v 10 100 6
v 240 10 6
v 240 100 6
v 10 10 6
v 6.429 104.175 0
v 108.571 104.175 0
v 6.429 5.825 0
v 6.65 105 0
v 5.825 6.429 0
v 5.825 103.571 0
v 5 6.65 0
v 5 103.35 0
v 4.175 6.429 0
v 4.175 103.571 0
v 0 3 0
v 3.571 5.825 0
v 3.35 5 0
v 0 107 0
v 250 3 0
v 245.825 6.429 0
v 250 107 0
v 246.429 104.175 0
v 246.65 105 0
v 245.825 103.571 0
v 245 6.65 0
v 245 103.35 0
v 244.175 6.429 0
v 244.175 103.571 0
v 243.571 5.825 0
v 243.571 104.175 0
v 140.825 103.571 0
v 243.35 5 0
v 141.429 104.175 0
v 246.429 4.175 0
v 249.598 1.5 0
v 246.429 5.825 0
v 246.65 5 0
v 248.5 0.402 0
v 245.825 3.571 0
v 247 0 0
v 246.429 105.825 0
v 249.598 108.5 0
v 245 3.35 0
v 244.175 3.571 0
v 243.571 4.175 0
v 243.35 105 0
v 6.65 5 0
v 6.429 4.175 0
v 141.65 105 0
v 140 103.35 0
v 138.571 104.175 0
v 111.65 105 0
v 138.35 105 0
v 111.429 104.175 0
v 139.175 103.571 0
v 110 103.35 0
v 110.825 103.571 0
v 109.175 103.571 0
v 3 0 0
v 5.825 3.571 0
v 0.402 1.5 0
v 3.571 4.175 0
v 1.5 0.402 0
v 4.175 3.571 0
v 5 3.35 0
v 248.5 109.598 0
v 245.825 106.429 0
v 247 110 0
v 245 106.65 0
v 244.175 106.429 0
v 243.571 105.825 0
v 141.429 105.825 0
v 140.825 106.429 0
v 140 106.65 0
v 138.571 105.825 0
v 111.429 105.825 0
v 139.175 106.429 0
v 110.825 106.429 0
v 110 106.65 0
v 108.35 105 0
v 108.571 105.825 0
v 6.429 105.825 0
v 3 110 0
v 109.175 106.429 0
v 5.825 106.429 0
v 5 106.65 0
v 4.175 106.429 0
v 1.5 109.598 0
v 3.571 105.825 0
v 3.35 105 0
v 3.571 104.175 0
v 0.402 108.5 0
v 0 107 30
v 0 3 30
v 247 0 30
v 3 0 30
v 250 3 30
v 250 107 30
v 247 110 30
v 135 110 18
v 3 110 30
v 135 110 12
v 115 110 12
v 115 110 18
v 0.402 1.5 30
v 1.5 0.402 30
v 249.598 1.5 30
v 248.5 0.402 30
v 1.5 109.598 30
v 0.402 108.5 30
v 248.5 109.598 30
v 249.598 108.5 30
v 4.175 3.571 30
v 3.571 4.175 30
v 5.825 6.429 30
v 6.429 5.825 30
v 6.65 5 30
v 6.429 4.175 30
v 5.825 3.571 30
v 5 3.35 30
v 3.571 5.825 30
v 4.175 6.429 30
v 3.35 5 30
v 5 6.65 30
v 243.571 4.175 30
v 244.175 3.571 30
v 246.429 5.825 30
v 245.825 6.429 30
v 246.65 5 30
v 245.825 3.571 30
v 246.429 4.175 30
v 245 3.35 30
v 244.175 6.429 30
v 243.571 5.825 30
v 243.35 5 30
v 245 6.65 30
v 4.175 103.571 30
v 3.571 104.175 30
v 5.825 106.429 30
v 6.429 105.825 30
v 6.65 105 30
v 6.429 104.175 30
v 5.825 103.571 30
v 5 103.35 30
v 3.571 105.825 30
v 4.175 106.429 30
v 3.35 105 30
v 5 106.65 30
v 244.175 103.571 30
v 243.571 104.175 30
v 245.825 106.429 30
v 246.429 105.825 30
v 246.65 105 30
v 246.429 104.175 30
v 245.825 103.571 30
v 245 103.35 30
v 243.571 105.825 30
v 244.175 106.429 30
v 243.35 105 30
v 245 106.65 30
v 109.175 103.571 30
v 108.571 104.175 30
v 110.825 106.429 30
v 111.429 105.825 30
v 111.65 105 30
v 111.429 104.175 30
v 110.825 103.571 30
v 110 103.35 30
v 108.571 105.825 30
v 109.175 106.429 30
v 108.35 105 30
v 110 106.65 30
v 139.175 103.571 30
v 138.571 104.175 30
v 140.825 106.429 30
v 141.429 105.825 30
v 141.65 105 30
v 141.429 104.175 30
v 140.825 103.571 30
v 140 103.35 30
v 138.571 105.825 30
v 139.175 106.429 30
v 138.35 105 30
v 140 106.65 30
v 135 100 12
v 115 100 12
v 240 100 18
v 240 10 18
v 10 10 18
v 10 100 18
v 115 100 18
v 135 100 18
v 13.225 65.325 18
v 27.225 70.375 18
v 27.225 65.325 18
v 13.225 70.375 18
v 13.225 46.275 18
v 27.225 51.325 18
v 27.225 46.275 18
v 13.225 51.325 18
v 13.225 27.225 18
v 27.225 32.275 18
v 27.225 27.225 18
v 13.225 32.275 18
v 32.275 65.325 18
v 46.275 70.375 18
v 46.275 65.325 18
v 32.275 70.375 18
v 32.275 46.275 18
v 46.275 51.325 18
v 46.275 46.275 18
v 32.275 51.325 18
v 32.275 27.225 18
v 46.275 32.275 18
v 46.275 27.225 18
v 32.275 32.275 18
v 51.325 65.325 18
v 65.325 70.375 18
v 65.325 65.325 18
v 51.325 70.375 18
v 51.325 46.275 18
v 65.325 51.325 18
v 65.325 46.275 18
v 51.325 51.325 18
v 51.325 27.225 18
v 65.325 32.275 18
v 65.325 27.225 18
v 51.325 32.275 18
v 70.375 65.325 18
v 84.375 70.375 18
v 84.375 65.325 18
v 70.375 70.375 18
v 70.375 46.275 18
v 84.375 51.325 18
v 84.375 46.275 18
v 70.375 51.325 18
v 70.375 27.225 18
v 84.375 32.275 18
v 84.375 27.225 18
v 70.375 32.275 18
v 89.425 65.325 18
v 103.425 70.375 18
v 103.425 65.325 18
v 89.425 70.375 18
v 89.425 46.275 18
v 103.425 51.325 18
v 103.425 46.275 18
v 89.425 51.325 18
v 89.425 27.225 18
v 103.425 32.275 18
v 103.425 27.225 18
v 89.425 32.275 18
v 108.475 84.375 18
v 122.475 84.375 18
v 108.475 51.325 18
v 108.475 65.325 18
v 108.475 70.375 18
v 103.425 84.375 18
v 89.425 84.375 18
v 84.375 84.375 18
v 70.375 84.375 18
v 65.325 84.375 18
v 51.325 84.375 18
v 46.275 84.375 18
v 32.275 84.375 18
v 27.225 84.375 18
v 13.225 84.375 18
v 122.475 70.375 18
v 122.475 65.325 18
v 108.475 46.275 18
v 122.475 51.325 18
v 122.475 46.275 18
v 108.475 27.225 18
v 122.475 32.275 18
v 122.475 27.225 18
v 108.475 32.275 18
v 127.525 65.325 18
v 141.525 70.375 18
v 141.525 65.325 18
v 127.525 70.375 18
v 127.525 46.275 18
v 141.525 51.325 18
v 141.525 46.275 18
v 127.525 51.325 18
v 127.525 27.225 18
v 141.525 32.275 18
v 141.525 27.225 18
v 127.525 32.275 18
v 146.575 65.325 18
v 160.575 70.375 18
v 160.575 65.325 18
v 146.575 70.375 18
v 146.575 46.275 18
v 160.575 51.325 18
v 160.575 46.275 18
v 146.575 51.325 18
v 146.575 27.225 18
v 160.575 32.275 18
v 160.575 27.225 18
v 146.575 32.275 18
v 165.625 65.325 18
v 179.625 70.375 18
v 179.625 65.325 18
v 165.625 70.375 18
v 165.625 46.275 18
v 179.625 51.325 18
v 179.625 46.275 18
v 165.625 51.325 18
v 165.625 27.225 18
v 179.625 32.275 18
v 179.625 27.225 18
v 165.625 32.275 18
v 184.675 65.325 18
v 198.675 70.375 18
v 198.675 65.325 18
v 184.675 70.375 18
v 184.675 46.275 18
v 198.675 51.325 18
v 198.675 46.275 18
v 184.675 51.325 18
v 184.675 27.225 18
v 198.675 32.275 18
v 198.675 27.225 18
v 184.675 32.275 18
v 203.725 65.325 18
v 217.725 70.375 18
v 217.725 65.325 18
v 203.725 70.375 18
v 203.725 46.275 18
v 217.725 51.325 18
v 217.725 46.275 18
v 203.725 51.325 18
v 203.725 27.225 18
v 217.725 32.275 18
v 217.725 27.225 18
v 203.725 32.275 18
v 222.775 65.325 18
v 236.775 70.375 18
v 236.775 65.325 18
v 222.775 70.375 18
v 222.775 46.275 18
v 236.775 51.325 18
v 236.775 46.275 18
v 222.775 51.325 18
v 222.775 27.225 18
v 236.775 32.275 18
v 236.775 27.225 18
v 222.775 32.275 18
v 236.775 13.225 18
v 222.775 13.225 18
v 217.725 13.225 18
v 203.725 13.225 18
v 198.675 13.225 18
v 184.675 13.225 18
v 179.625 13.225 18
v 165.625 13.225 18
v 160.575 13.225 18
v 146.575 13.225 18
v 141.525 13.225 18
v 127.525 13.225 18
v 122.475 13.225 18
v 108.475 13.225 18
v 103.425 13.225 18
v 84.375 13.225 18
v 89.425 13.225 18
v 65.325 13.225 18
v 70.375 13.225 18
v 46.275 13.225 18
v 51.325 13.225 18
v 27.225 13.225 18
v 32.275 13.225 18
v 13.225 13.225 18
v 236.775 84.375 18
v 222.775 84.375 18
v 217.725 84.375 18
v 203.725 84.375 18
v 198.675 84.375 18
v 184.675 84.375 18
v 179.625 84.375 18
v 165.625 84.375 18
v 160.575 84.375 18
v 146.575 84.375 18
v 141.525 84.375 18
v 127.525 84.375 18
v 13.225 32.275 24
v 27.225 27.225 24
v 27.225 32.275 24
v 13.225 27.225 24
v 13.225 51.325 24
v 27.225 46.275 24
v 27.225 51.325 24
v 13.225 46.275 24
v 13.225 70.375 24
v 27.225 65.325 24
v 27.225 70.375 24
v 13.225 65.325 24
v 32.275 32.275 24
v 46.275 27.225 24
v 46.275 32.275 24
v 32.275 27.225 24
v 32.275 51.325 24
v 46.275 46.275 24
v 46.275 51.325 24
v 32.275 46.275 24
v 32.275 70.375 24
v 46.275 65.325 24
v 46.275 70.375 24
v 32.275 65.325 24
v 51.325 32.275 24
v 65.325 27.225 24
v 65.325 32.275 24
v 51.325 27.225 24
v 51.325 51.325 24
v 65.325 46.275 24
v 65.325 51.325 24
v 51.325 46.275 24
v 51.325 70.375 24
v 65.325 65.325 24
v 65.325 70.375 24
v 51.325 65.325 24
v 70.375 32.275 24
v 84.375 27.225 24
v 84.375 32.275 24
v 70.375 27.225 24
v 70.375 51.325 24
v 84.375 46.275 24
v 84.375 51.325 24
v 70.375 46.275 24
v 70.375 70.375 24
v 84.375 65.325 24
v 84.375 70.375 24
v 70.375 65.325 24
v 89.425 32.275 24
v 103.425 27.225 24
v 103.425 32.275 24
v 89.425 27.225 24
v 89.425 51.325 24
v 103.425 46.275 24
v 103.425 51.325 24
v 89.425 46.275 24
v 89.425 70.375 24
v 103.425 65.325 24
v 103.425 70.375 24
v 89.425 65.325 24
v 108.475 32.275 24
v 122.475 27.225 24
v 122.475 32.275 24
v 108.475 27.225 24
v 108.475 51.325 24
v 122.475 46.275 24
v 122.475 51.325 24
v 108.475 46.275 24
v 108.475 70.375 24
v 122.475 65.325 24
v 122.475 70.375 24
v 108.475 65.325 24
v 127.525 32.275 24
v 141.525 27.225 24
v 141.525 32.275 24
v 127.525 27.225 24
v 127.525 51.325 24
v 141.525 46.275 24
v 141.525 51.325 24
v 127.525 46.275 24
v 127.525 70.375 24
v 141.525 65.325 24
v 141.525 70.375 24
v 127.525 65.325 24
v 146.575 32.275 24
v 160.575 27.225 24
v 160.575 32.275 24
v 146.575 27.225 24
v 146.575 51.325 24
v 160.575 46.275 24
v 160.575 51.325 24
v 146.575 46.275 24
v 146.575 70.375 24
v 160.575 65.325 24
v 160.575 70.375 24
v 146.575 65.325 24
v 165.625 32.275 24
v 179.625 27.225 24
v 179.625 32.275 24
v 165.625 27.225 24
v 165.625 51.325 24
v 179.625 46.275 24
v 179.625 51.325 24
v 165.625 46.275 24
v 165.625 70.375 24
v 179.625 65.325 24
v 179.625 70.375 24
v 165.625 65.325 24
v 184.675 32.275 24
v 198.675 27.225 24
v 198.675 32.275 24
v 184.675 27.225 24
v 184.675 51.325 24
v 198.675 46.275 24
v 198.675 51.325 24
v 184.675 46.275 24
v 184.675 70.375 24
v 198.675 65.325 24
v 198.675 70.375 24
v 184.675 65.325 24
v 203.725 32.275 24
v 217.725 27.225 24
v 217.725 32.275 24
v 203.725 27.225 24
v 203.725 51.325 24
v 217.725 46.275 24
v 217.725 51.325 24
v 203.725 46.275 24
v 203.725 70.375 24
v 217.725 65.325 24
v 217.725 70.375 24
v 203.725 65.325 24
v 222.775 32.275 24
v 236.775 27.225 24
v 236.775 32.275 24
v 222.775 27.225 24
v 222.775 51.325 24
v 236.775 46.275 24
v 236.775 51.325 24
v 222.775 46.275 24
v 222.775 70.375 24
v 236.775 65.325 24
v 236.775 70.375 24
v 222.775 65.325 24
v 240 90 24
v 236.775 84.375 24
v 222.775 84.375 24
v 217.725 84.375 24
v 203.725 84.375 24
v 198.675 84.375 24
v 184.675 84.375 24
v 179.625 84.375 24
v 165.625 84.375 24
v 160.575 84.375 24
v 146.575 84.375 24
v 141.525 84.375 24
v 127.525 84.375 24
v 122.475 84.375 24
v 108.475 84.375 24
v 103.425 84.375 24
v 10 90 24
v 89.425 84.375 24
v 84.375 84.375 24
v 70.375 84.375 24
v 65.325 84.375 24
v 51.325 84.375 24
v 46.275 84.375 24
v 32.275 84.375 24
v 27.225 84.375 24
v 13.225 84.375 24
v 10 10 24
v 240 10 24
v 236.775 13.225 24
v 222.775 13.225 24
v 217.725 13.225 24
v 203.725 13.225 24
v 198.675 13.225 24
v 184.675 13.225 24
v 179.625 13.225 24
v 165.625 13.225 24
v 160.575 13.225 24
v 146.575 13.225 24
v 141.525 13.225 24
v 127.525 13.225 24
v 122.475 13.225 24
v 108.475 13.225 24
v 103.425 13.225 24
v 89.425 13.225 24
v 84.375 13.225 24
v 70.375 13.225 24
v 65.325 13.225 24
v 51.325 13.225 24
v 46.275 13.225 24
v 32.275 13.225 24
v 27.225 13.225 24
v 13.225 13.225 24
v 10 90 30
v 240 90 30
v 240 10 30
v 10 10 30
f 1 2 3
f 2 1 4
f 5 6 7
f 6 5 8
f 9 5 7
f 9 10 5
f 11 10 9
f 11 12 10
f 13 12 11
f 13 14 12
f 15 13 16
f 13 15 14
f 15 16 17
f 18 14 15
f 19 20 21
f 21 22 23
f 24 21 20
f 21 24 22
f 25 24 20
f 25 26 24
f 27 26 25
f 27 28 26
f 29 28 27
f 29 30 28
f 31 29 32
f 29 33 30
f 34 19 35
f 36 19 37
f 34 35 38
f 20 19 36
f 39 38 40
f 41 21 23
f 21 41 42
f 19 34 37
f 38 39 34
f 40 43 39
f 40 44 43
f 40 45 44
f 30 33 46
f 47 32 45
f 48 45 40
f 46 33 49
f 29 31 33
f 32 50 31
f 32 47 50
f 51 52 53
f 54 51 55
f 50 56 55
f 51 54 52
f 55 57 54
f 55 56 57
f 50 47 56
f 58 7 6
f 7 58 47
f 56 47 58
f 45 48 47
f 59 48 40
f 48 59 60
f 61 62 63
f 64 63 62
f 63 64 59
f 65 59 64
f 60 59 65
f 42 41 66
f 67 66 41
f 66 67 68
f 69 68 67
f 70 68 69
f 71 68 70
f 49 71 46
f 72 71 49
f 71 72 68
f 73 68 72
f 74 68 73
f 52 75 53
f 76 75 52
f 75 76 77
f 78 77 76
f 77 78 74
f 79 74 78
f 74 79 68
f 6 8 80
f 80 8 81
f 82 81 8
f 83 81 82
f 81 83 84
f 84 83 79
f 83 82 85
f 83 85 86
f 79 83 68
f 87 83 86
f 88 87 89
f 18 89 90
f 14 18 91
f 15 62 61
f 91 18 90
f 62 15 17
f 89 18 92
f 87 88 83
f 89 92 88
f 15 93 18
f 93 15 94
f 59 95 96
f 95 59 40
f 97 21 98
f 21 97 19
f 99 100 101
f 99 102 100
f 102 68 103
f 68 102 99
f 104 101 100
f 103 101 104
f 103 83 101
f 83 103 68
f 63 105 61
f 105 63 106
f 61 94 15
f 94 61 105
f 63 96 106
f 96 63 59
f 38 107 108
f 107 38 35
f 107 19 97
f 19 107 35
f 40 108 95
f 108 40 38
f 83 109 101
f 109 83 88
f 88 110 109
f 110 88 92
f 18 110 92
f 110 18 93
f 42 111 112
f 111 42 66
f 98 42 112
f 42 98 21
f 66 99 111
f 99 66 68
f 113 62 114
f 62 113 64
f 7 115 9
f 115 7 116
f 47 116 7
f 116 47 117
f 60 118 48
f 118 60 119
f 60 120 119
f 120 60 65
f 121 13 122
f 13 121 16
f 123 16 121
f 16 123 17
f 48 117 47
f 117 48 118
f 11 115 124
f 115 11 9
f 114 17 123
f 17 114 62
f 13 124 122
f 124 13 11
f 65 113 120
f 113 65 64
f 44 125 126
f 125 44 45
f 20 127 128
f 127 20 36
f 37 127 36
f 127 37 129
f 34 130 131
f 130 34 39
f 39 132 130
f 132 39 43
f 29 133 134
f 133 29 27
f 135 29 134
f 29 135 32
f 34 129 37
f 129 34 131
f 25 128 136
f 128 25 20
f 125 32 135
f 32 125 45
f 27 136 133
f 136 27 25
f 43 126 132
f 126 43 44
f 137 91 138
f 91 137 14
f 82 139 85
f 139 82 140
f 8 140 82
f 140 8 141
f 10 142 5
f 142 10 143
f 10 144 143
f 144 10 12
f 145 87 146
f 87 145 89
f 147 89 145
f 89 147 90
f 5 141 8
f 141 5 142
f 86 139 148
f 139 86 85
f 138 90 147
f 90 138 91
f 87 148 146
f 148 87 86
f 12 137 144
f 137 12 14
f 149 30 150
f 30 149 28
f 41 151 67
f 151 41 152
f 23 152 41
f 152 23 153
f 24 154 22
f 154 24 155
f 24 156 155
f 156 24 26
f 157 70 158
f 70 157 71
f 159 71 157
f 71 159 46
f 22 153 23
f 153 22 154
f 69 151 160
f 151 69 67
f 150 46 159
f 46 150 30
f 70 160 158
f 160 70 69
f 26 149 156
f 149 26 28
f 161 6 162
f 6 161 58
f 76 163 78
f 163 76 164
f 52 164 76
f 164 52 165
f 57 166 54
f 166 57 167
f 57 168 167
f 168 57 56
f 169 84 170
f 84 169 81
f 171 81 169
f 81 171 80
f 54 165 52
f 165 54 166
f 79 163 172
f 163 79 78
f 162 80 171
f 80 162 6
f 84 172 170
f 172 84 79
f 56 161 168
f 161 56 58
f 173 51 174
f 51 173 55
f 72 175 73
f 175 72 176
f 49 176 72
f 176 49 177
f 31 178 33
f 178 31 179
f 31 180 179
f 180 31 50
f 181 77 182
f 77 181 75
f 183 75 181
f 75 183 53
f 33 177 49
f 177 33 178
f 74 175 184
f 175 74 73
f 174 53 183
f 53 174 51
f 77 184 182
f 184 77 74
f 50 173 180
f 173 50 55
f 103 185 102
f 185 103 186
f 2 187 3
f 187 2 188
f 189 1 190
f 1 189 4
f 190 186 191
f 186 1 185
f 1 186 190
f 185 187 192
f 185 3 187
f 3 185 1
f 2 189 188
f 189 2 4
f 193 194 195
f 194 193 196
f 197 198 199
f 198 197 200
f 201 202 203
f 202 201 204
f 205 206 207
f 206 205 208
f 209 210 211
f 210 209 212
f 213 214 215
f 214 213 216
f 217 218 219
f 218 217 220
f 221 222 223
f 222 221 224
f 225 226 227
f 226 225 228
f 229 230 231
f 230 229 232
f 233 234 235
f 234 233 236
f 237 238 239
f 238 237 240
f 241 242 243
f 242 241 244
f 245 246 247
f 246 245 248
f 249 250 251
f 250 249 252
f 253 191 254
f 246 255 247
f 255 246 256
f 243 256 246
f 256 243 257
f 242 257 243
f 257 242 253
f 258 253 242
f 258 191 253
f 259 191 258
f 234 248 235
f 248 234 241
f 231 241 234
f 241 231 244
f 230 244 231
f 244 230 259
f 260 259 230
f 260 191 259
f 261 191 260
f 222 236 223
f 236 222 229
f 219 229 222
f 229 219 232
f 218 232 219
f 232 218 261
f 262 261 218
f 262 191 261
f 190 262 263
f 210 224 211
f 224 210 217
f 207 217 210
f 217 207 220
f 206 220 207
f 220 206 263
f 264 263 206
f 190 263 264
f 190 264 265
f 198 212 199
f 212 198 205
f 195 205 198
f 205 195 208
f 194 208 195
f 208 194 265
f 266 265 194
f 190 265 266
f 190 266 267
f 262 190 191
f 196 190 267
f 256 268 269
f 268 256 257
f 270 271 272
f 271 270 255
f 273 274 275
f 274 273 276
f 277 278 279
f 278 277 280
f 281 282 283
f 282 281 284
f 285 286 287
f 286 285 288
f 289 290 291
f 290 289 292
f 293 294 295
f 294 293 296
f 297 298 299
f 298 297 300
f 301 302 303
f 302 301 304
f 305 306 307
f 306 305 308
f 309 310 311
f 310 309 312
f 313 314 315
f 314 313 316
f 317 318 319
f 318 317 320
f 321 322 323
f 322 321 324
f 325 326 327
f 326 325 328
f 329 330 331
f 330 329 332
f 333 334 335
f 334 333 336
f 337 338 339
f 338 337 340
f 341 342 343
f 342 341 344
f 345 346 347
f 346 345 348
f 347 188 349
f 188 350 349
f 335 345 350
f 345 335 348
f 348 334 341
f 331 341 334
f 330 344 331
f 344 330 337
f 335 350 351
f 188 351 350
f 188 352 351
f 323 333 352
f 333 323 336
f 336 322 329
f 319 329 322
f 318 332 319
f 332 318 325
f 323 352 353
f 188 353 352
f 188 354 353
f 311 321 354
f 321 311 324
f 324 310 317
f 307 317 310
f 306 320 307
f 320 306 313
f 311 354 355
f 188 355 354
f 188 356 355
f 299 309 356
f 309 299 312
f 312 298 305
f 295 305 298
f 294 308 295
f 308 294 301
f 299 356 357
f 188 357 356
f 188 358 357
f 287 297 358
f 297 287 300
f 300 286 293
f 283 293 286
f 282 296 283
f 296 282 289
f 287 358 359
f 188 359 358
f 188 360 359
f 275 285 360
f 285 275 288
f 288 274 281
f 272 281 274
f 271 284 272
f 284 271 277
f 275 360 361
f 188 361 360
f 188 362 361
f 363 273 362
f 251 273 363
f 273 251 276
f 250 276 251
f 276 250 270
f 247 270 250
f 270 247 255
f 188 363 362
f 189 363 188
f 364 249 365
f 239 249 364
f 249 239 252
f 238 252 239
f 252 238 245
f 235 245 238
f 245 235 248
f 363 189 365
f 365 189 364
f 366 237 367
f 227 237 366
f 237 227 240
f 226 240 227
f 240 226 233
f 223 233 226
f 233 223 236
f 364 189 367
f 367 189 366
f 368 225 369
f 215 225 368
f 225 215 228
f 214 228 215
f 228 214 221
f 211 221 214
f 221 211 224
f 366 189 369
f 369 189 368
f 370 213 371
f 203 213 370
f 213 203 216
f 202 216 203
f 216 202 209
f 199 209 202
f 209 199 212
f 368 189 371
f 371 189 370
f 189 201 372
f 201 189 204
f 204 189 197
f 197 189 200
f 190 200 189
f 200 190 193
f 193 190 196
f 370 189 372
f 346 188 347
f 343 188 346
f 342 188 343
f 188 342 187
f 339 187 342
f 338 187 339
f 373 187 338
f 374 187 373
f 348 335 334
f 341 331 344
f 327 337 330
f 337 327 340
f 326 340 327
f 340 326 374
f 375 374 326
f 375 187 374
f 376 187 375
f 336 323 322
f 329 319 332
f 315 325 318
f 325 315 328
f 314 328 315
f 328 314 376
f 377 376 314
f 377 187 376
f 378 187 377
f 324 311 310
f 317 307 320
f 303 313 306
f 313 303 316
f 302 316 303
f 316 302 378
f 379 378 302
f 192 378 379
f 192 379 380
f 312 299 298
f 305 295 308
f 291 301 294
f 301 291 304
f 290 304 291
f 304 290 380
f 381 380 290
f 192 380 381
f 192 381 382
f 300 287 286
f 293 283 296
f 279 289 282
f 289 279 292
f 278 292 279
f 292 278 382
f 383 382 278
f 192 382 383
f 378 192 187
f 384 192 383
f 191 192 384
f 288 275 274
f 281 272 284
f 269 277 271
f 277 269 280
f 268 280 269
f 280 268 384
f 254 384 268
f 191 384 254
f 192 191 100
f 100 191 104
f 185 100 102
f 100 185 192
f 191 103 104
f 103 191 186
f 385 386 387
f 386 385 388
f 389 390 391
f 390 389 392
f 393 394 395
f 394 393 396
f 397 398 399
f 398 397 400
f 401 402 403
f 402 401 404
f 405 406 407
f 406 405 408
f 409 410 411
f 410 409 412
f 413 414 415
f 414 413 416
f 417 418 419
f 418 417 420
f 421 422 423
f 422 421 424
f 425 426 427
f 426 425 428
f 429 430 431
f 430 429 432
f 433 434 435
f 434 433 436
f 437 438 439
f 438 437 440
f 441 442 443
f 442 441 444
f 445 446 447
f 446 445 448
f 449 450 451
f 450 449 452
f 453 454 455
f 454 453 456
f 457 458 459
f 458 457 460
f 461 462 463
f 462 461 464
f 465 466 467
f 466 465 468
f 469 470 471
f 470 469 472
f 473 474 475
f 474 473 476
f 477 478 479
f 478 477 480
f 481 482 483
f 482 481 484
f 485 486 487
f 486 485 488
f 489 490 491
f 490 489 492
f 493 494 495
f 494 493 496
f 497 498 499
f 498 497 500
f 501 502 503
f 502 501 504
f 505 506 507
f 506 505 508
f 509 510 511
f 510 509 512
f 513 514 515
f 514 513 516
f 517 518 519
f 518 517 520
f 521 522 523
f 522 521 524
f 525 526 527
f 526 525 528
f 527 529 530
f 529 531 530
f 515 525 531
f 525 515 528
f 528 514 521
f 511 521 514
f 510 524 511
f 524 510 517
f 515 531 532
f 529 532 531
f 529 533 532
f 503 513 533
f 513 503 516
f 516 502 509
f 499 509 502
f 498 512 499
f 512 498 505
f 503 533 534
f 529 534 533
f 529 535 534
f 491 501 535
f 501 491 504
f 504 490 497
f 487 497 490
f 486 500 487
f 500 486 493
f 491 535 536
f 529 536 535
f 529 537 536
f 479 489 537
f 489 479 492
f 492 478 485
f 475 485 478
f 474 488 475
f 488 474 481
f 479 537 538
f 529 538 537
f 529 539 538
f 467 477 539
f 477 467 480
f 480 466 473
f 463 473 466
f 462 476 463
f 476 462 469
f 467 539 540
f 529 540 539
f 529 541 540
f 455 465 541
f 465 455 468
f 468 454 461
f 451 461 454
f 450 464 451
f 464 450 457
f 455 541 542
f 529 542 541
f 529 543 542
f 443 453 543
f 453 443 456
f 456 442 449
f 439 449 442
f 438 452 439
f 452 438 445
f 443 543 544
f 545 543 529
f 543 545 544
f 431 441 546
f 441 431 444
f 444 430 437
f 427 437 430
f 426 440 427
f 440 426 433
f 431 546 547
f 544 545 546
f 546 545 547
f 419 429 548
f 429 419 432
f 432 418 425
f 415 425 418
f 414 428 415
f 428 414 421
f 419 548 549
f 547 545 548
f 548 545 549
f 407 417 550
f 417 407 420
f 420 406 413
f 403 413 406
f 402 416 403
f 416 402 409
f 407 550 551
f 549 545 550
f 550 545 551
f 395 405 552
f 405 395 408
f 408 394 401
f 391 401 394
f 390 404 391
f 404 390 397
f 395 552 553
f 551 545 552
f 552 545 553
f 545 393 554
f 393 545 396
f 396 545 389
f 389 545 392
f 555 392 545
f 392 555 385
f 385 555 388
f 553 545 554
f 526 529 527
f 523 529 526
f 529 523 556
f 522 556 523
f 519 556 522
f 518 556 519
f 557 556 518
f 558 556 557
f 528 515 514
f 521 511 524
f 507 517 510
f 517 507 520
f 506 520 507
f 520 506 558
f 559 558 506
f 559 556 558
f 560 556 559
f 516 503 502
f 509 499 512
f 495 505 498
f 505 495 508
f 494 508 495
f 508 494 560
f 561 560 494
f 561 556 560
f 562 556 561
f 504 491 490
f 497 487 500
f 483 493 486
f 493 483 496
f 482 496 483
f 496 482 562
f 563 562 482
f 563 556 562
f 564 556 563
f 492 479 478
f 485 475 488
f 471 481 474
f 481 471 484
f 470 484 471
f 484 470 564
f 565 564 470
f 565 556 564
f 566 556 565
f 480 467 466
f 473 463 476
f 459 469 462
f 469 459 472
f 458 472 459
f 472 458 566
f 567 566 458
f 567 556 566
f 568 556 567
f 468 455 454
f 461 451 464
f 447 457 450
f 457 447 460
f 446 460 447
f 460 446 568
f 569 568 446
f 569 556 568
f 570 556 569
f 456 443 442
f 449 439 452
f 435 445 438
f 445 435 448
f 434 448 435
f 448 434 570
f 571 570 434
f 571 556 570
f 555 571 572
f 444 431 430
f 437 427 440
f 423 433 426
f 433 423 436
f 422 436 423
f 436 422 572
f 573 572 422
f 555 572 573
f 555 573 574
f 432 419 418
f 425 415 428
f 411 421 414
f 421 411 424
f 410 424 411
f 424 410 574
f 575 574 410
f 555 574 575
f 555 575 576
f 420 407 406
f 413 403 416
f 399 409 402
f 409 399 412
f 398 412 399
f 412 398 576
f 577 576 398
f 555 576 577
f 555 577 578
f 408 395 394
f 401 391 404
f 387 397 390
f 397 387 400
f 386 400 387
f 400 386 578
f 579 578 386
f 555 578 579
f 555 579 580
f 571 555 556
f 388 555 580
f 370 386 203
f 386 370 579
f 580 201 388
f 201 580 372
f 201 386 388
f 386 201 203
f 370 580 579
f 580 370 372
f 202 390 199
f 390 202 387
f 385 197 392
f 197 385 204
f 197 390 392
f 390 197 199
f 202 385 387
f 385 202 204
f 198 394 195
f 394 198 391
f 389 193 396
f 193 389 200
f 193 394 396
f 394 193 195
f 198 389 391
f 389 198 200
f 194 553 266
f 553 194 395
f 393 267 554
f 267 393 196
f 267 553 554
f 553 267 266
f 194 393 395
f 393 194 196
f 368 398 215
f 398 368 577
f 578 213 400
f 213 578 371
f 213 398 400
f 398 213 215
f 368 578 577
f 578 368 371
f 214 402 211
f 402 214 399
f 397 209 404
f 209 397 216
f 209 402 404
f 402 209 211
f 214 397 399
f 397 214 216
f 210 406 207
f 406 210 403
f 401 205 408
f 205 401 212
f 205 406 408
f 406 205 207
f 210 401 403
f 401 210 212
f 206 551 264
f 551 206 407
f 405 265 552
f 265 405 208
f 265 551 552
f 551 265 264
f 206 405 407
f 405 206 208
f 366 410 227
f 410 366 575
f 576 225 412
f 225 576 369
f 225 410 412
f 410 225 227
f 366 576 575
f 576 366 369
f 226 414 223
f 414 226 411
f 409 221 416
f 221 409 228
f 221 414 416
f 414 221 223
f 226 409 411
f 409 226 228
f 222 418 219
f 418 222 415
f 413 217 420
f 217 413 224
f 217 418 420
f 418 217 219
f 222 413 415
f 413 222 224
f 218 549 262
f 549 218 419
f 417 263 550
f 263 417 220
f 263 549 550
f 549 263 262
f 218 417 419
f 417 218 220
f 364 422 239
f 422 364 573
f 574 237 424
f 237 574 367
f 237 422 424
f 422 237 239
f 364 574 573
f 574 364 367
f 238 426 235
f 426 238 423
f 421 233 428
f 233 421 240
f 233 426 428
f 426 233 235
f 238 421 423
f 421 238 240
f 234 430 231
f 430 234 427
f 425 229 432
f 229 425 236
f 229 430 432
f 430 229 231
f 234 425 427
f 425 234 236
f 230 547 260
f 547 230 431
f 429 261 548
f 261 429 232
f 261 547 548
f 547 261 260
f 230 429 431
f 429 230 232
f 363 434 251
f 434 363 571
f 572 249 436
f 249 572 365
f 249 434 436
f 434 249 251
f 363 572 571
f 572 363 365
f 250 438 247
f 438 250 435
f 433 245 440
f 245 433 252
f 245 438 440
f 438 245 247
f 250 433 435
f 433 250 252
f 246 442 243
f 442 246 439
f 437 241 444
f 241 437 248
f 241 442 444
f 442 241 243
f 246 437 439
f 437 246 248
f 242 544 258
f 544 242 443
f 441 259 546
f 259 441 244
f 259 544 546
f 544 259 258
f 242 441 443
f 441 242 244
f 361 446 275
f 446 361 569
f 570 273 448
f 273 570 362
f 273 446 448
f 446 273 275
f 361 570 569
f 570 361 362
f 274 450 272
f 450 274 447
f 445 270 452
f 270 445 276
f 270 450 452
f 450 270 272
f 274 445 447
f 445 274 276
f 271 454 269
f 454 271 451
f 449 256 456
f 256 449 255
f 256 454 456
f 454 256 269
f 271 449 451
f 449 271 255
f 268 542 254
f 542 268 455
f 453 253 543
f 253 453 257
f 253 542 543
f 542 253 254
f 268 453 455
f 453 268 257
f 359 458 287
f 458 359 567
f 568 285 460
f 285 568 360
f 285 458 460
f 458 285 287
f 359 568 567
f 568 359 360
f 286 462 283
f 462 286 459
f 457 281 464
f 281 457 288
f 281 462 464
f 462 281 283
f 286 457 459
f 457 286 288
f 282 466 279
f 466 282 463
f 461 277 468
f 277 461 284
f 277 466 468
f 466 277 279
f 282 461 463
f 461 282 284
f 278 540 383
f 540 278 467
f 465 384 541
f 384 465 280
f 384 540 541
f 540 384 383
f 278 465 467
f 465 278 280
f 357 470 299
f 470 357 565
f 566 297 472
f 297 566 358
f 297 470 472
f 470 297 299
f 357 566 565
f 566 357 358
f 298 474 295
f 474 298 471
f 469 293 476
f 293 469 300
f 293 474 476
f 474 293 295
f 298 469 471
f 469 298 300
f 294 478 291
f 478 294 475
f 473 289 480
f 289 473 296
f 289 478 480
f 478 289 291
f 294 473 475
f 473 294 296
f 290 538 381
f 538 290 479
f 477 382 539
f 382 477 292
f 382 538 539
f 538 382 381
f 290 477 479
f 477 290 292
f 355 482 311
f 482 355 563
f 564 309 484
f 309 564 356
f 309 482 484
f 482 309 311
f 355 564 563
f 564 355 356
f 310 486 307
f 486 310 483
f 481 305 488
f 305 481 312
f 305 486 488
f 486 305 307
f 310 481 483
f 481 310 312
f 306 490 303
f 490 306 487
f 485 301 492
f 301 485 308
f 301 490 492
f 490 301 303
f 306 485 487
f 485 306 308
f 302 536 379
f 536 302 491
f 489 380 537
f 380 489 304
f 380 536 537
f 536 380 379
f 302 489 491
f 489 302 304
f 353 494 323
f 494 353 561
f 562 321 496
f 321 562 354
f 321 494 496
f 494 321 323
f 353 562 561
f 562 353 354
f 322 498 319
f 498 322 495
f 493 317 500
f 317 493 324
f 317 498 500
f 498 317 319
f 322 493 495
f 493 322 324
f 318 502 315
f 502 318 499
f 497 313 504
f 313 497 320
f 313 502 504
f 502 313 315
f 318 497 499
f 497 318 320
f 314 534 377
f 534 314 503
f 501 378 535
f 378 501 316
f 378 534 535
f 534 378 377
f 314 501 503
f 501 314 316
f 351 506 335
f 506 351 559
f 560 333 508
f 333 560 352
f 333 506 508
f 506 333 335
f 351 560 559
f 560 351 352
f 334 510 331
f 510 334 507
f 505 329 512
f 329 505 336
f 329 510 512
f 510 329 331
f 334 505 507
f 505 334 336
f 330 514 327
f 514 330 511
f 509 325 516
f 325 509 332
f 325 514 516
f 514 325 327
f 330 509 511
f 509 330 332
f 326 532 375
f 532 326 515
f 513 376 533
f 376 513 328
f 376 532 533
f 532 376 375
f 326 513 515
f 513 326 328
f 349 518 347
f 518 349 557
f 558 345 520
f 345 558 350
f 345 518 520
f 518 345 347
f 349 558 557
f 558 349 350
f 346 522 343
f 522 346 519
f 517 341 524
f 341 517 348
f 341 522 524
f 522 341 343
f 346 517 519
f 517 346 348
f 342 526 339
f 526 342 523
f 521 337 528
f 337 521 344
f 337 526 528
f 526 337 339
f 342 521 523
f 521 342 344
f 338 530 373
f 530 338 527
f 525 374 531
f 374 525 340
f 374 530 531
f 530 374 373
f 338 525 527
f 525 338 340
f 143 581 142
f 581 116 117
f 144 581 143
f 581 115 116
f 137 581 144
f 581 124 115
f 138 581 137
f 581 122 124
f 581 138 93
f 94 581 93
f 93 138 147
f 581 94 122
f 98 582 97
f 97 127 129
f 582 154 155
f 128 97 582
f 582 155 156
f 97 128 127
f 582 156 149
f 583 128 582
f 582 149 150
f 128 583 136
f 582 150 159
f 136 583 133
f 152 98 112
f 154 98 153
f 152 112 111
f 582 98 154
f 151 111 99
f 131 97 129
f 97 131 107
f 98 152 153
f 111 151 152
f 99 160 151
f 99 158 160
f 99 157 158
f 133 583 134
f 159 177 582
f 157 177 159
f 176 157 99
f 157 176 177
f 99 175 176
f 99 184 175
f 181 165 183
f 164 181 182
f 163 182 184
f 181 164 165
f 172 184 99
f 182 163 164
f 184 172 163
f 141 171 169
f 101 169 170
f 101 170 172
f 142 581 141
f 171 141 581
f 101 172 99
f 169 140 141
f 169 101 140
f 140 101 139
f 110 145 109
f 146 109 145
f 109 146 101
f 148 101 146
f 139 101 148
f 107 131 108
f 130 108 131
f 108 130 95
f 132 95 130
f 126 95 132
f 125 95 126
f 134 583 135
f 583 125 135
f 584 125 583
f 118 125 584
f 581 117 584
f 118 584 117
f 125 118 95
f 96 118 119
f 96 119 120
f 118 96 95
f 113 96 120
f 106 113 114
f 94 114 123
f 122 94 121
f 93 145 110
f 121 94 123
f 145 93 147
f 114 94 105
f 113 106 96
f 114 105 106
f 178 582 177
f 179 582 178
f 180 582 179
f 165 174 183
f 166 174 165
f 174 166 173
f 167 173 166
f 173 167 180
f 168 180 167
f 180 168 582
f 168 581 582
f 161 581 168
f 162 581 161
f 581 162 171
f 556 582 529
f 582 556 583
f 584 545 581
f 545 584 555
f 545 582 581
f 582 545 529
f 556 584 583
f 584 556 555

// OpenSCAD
$fn = 12;

gd = 6;

module usb_cutout(cx, ty, w, h)
{
    translate([cx - (w / 2), ty - h, 0])
        cube([w, h, gd]);
}

module switch_holes(c, r)
{
	for (i = [0 : c-1])
	{
		for (j = [0 : r-1])
		{
			translate([i * 19.05, j * 19.05, 0])
				cube([14, 14, gd]);
		}
	}
}

module screw(d = 3, t = 0.15)
{
	cylinder(h=gd, r=((d / 2) + t));
}

module screws(w, h)
{
	translate([5, 5, 0])
		screw();
	translate([w - 5, 5, 0])
		screw();
	translate([5, h - 5, 0])
		screw();
	translate([w - 5, h - 5, 0])
		screw();
	translate([(w / 2) - 15, h - 5, 0])
		screw();
	translate([(w / 2) + 15, h - 5, 0])
		screw();
}

module case(r = 3, w = 250, h = 110)
{
	difference()
	{
		union()
		{
			difference()
			{
				cube([w, h, gd]);
				if (r != 0)
				{
					translate([0, 0, 0])
						cube([r, r, gd]);
					translate([w - r, 0])
						cube([r, r, gd]);
					translate([0, h - r, 0])
						cube([r, r, gd]);
					translate([w - r, h - r, 0])
						cube([r, r, gd]);
				}
			}
			if (r != 0)
			{
				translate([r, r, 0])
					cylinder(h=gd, r=r);
				translate([w - r, r, 0])
					cylinder(h=gd, r=r);
				translate([r, h - r, 0])
					cylinder(h=gd, r=r);
				translate([w - r, h - r, 0])
					cylinder(h=gd, r=r);
			}
		}
		screws(w, h);
	}
}

module open()
{
	difference()
	{
		case(3);
		translate([10, 10, 0])
			cube([230, 90, gd]);
		usb_cutout(250 / 2, 110, 20, 10);
	}
}

module closed()
{
	difference()
	{
		case(3);
		translate([10, 10, 0])
			cube([230, 90, gd]);
	}
}

module bottom()
{
	case(3);
}

module top()
{
	difference()
	{
		case(3);
		translate([10, 10, 0])
			cube([250 - 20, 110 - 30, gd]);
	}
}

module switch_plate()
{
	difference()
	{
		case(3);
		translate([13.225, 13.225, 0])
			switch_holes(12, 4);
	}
}

translate([0, 0, 0]);
    bottom();
translate([0, 0, gd])
    closed();
translate([0, 0, gd * 2])
    open();
translate([0, 0, gd * 3])
    switch_plate();
translate([0, 0, gd * 4])
    top();
//switch_plate();
//open();
//top();
//bottom();
//closed();
